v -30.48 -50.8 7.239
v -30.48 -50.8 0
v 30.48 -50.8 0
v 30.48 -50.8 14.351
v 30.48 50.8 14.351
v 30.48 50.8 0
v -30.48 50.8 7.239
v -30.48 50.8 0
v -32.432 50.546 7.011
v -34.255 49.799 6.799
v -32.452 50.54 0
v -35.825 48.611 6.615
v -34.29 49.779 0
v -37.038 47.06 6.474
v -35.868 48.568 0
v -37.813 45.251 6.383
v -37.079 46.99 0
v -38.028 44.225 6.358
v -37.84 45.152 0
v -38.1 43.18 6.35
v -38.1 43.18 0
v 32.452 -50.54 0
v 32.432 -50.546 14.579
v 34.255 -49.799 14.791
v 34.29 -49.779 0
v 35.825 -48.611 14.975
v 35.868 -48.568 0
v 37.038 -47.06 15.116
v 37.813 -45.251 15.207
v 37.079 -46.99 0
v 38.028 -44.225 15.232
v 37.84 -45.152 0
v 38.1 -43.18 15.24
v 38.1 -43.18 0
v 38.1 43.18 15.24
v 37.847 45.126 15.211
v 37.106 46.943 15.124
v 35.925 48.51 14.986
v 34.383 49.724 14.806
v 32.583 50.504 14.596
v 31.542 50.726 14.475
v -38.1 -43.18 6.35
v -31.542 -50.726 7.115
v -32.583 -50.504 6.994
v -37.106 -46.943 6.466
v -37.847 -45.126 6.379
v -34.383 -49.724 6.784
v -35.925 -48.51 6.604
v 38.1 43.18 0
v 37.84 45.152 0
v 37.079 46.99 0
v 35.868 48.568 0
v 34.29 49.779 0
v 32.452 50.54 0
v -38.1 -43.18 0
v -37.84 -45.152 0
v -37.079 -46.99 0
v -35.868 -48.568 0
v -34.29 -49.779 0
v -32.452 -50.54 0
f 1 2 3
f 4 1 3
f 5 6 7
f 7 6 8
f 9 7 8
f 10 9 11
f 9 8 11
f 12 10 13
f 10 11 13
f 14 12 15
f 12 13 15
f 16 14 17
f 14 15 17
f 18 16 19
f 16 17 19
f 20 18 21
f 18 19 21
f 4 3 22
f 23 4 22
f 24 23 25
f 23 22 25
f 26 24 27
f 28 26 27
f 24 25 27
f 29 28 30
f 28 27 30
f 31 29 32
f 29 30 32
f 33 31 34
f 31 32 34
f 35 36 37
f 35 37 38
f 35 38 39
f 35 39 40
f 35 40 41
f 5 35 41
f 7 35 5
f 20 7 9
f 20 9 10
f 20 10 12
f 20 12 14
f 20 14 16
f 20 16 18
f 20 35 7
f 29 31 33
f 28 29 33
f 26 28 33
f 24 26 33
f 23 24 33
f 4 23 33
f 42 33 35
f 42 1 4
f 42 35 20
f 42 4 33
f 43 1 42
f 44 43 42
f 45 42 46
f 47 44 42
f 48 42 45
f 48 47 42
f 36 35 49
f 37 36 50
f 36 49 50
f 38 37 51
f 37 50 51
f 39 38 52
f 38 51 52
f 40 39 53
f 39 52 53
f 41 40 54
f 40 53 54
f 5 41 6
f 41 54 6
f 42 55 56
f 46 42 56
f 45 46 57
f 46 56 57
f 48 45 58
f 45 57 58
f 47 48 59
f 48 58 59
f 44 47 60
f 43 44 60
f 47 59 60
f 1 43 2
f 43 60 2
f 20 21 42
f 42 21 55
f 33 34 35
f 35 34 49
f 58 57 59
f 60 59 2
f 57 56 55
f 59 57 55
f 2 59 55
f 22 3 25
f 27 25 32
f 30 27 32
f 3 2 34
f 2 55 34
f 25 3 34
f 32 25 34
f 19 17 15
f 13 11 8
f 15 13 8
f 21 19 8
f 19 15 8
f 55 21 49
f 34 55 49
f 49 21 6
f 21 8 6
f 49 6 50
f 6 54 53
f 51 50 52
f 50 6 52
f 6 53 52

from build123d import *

# Parameters (mm, degrees)
F3_DEPTH = 15.24
F4_DEPTH = 304.801


with BuildPart() as f3:
    # F1 (on Top) → F3 (new body, through all)
    with BuildSketch(Plane.XY):
        with BuildLine():
            Line((30.48, 50.8), (-30.48, 50.8))
            ThreePointArc((-30.48, 50.8), (-35.868154, 48.568154), (-38.1, 43.18))
            Line((-38.1, 43.18), (-38.1, -43.18))
            ThreePointArc((-38.1, -43.18), (-35.868154, -48.568154), (-30.48, -50.8))
            Line((-30.48, -50.8), (30.48, -50.8))
            ThreePointArc((30.48, -50.8), (35.868154, -48.568154), (38.1, -43.18))
            Line((38.1, -43.18), (38.1, 43.18))
            ThreePointArc((38.1, 43.18), (35.868154, 48.568154), (30.48, 50.8))
        make_face()
    extrude(amount=F3_DEPTH)

    # F2 (on offset) → F4 (intersect, through all)
    with BuildSketch(Plane.XZ.offset(254)):
        Polygon((-38.1, 6.35), (-38.1, 0), (38.1, 0), (38.1, 15.24), align=None)
    extrude(amount=-F4_DEPTH, mode=Mode.INTERSECT)


solid = f3.part
